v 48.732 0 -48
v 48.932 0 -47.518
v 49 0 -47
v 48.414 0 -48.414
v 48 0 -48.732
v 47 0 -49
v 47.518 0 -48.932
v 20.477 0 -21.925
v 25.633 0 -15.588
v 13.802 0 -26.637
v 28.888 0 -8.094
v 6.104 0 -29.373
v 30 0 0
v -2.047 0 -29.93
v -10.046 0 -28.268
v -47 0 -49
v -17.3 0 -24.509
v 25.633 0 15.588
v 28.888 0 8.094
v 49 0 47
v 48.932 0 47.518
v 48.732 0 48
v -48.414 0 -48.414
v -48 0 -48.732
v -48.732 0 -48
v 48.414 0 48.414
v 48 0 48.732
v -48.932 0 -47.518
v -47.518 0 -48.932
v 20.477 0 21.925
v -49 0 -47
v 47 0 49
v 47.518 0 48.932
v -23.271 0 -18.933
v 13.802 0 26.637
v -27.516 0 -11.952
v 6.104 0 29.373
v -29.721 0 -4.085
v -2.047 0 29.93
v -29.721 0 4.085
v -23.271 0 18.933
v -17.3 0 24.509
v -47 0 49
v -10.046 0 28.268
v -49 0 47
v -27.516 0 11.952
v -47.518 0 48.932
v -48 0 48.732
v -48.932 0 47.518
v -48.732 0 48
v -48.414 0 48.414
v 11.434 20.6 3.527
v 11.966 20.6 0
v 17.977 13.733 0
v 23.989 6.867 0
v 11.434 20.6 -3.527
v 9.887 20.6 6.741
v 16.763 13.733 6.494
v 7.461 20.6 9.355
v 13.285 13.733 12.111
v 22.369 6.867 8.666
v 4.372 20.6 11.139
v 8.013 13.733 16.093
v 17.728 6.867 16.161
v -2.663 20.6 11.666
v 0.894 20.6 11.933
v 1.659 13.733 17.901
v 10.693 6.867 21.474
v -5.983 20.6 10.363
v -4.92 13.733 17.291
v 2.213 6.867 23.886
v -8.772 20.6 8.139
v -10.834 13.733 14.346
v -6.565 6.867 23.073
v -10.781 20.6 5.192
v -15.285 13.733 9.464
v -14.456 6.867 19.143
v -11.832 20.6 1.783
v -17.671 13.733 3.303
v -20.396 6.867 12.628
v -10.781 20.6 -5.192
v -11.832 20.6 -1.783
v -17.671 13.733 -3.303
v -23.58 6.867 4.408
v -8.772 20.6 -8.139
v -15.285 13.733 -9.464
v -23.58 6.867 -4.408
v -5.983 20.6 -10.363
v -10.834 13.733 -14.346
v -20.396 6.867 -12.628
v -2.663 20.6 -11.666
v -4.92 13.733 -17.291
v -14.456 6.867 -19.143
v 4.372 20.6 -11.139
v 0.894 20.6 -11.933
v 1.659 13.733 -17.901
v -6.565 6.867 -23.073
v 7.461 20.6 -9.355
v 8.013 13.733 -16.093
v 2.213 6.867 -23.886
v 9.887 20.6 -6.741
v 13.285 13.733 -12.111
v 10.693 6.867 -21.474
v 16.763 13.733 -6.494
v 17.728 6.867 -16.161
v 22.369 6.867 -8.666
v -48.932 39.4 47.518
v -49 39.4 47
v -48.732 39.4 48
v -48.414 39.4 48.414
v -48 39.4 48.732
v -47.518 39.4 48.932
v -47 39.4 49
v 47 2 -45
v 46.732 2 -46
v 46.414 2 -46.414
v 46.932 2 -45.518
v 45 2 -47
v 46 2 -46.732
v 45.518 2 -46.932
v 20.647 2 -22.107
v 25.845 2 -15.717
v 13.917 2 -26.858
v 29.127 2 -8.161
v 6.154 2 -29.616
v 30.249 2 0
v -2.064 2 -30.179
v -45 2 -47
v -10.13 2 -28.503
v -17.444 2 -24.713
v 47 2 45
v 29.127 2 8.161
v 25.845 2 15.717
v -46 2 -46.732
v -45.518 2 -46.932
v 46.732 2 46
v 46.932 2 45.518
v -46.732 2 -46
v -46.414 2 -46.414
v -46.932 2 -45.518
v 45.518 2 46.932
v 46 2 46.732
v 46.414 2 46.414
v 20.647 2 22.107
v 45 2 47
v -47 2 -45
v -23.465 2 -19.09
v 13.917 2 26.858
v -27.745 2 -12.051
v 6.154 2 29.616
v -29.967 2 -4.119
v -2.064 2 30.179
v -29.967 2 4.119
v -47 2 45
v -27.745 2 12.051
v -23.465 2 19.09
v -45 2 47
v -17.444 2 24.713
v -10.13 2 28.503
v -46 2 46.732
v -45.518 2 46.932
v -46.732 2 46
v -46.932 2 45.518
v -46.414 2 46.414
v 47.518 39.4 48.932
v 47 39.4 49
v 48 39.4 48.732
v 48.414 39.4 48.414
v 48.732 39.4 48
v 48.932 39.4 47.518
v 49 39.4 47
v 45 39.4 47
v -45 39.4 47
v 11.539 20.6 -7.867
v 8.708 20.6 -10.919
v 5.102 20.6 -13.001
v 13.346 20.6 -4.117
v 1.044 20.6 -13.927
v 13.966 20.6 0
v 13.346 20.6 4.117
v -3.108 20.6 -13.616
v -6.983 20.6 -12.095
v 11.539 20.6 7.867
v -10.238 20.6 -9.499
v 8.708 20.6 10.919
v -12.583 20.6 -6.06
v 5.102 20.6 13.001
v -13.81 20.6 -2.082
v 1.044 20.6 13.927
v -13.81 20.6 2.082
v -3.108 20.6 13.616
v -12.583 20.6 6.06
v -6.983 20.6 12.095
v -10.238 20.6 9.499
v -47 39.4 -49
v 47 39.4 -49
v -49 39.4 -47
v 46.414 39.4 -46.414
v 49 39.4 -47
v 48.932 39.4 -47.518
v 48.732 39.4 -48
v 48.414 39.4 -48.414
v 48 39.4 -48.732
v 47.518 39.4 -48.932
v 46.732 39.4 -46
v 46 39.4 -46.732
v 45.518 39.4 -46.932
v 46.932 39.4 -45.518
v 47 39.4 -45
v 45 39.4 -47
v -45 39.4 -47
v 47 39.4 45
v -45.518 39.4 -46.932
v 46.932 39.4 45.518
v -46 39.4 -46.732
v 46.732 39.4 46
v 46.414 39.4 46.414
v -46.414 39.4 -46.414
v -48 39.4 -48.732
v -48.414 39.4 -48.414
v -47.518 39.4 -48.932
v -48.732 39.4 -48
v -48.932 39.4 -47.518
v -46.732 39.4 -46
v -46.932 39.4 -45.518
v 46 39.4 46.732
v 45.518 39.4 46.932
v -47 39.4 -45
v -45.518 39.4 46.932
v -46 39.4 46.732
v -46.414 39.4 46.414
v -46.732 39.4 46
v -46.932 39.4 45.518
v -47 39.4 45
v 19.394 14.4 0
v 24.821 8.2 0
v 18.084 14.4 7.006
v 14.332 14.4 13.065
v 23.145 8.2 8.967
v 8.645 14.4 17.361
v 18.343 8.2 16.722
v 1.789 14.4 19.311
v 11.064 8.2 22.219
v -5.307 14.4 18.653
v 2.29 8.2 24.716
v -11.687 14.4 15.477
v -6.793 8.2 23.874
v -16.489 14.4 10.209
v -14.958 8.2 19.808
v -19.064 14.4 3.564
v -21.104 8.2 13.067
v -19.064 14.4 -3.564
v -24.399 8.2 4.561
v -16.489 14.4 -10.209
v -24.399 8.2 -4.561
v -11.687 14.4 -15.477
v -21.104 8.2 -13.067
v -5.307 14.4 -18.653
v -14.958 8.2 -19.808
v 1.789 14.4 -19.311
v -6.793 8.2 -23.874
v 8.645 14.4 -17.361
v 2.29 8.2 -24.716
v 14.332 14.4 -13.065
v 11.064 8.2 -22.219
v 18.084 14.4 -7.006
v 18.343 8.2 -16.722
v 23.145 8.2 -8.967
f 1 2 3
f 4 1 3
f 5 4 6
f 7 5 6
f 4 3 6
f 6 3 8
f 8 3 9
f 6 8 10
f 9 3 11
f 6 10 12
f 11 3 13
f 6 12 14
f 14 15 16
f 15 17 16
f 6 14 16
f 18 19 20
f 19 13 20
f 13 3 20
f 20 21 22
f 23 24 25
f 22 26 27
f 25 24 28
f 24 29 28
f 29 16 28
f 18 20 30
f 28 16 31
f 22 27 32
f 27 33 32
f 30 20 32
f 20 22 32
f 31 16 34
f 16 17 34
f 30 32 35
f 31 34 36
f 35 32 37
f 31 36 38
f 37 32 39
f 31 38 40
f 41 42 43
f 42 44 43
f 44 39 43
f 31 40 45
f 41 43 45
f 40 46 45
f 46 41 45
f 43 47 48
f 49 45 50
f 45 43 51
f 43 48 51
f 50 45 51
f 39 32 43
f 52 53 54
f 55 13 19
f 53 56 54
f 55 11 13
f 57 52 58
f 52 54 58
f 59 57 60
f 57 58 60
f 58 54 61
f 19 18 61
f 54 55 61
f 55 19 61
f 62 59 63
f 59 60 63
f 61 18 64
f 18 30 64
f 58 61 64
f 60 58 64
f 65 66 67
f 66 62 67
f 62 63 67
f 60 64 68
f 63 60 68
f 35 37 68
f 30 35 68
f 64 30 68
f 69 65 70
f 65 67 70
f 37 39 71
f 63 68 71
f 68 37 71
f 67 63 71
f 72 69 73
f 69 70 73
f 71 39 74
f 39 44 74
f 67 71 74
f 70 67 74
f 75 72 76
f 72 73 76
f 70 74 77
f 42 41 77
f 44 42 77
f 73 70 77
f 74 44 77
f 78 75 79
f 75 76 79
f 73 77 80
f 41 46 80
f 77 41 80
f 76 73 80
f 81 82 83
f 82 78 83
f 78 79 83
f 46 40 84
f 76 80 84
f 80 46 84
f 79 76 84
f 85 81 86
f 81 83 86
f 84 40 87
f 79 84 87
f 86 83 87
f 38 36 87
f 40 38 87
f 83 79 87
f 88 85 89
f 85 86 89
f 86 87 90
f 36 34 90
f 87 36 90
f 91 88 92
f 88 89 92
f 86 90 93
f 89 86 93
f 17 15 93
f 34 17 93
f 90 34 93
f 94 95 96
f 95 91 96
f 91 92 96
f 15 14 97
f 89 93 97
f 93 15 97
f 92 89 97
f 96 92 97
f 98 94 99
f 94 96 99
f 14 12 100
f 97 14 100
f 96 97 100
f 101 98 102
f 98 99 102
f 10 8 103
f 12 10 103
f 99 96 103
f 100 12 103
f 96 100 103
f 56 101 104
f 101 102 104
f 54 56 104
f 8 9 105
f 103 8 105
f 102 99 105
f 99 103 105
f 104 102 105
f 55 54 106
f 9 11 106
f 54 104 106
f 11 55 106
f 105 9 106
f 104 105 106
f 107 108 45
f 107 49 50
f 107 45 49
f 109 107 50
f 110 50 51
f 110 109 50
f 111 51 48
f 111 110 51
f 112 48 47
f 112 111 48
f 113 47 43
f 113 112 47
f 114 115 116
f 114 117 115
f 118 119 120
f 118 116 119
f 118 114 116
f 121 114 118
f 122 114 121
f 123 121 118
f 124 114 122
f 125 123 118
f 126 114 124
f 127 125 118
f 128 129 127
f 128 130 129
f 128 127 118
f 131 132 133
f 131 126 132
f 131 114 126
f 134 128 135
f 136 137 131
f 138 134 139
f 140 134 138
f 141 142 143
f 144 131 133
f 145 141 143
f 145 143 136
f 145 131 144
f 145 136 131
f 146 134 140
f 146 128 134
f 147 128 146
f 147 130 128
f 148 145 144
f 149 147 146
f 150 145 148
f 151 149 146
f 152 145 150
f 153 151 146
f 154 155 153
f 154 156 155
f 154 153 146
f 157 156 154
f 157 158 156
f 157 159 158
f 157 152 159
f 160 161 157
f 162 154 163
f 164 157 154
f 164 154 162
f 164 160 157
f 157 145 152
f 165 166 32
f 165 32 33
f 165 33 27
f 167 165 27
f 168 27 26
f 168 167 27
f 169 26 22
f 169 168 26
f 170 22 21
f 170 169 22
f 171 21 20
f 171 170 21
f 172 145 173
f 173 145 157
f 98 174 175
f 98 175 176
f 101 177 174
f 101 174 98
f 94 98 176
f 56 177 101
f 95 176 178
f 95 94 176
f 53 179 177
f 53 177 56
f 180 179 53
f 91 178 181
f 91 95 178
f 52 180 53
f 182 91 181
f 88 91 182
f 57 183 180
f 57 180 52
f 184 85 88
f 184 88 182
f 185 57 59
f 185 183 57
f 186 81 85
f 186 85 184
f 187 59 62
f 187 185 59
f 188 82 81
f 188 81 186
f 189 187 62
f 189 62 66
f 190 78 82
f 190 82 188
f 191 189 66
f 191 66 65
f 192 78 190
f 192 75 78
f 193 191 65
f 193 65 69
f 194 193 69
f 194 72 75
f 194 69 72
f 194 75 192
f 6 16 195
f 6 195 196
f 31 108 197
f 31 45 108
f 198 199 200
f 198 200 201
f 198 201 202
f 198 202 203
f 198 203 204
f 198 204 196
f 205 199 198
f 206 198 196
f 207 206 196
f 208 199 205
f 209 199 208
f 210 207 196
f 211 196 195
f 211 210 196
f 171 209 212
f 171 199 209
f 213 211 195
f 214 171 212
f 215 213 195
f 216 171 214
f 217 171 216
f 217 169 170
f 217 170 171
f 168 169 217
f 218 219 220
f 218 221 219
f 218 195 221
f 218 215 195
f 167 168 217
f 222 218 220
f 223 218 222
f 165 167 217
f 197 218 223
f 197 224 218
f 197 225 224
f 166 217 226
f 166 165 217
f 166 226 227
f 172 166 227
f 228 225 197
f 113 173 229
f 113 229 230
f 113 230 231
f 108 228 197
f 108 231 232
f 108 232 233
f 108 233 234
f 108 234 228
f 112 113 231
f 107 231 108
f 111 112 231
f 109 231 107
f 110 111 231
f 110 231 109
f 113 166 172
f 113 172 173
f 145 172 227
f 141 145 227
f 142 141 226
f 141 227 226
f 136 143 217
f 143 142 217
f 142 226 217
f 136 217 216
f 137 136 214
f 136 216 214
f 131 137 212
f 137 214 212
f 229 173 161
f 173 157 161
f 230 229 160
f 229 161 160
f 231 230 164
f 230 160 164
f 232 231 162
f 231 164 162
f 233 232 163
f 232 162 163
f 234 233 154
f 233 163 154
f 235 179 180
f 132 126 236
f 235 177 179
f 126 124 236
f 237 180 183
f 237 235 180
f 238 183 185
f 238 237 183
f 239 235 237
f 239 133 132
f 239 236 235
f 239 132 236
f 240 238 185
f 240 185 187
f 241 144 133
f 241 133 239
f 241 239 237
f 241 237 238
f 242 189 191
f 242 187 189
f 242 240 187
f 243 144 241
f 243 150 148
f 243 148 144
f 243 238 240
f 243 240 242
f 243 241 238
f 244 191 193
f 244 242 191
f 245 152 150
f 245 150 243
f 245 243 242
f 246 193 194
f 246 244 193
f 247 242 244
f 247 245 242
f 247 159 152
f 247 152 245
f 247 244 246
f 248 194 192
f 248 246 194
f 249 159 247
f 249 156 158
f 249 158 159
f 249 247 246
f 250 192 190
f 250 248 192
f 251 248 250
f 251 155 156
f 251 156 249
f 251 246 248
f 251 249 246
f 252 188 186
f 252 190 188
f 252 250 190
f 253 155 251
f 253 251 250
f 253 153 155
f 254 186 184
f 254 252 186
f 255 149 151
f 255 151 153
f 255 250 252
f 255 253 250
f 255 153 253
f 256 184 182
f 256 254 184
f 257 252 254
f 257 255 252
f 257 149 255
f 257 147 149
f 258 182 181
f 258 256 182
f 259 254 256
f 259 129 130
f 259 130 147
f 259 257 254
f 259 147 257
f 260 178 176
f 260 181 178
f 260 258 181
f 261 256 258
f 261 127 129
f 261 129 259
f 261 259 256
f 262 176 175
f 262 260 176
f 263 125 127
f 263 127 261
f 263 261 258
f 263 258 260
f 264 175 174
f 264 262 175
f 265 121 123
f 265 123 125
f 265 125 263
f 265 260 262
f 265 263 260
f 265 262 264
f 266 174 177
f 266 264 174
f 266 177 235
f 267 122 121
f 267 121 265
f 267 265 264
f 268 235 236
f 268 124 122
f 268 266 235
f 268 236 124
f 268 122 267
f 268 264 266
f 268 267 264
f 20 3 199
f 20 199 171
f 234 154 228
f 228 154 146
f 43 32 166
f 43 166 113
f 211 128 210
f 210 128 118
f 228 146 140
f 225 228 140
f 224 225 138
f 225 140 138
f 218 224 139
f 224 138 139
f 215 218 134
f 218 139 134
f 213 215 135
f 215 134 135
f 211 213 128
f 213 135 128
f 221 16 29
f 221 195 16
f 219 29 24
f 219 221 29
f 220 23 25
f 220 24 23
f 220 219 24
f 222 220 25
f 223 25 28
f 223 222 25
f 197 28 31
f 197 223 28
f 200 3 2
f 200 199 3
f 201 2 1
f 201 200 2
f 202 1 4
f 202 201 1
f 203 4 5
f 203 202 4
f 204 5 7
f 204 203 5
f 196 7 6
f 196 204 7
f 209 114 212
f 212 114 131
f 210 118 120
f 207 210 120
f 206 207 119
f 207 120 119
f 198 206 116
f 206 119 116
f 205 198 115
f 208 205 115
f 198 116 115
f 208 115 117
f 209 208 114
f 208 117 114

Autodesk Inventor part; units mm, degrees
ref_plane "YZ Plane" through (0, 0, 0) normal (1, 0, 0) x (0, 1, 0)
ref_plane "XY Plane" through (0, 0, 0) normal (0, 0, 1) x (1, 0, 0)
sketch "Esboço1" plane through (0, 0, 0) normal (0, 1, 0) x (-1, 0, 0)
  line L0 (-49, 49) -> (49, 49)
  line L1 (49, 49) -> (49, -49)
  line L2 (49, -49) -> (-49, -49)
  line L3 (-49, -49) -> (-49, 49)
  line L4 (-49, 49) -> (49, -49) construction
  line L5 (49, 49) -> (-49, -49) construction
  point P0 (0, 0)
  dimension "d0" = 98
  dimension "d1" = 98
extrude "Extrusão1" add sketch "Esboço1" along normal blind 39.4
shell "Casca1" thickness 2 removed faces 1 at (16.3333, 39.4, 16.3333)
sketch "Esboço3" plane through (0, 0, 0) normal (0, 0, 1) x (1, 0, 0)
  line L0 (0, 0) -> (32, 0)
  line L1 (49, 0) -> (-49, 0) projected
  line L2 (32, 0) -> (0, 36.5533)
  line L3 (0, 0) -> (0, 36.5533)
  point P0 (-43.1, 0)
  dimension "d6" = 32
  dimension "d7" = 48.8
revolve "Revolução1" add sketch "Esboço3" angle 360 about axis through (0, 0, 0) along (0, 1, 0)
sketch "Esboço4" plane through (0, 0, 0) normal (0, 0, 1) x (1, 0, 0)
  line L0 (0, 0) -> (30, 0)
  line L1 (-49, 0) -> (49, 0) projected
  line L2 (0, 36.5533) -> (-30.2491, 2) projected
  line L3 (30, 0) -> (0, 34.2687)
  line L4 (0, 0) -> (0, 34.2687)
  point P0 (43.1, 0)
  dimension "d9" = 30
  dimension "d10" = 48.8
revolve "Revolução2" cut sketch "Esboço4" angle 360 about axis through (0, 0, 0) along (0, 1, 0)
ref_plane "Plano de trabalho1" through (0, 39.4, 0) normal (0, 1, 0) x (-1, 0, 0)
sketch "Esboço5" plane through (0, 39.4, 0) normal (0, 1, 0) x (-1, 0, 0)
  line L0 (31.6566, 29.5617) -> (-31.6566, 29.5617)
  line L1 (-31.6566, 29.5617) -> (-31.6566, -29.5617)
  line L2 (-31.6566, -29.5617) -> (31.6566, -29.5617)
  line L3 (31.6566, -29.5617) -> (31.6566, 29.5617)
  line L4 (31.6566, 29.5617) -> (-31.6566, -29.5617) construction
  line L5 (-31.6566, 29.5617) -> (31.6566, -29.5617) construction
  point P0 (0, 0)
extrude "Extrusão2" cut sketch "Esboço5" against normal blind 18.8
sketch "Esboço6" plane through (0, 0, 0) normal (0, 1, 0) x (-1, 0, 0)
  point P0 (0, 0)
fillet "Arredondamento2" radius 2 8 edges at (47, 20.7, 47) (49, 19.7, 49) (-47, 20.7, 47) (-49, 19.7, 49) (-49, 19.7, -49) (-47, 20.7, -47) (49, 19.7, -49) (47, 20.7, -47)
properties part number "contenção"
